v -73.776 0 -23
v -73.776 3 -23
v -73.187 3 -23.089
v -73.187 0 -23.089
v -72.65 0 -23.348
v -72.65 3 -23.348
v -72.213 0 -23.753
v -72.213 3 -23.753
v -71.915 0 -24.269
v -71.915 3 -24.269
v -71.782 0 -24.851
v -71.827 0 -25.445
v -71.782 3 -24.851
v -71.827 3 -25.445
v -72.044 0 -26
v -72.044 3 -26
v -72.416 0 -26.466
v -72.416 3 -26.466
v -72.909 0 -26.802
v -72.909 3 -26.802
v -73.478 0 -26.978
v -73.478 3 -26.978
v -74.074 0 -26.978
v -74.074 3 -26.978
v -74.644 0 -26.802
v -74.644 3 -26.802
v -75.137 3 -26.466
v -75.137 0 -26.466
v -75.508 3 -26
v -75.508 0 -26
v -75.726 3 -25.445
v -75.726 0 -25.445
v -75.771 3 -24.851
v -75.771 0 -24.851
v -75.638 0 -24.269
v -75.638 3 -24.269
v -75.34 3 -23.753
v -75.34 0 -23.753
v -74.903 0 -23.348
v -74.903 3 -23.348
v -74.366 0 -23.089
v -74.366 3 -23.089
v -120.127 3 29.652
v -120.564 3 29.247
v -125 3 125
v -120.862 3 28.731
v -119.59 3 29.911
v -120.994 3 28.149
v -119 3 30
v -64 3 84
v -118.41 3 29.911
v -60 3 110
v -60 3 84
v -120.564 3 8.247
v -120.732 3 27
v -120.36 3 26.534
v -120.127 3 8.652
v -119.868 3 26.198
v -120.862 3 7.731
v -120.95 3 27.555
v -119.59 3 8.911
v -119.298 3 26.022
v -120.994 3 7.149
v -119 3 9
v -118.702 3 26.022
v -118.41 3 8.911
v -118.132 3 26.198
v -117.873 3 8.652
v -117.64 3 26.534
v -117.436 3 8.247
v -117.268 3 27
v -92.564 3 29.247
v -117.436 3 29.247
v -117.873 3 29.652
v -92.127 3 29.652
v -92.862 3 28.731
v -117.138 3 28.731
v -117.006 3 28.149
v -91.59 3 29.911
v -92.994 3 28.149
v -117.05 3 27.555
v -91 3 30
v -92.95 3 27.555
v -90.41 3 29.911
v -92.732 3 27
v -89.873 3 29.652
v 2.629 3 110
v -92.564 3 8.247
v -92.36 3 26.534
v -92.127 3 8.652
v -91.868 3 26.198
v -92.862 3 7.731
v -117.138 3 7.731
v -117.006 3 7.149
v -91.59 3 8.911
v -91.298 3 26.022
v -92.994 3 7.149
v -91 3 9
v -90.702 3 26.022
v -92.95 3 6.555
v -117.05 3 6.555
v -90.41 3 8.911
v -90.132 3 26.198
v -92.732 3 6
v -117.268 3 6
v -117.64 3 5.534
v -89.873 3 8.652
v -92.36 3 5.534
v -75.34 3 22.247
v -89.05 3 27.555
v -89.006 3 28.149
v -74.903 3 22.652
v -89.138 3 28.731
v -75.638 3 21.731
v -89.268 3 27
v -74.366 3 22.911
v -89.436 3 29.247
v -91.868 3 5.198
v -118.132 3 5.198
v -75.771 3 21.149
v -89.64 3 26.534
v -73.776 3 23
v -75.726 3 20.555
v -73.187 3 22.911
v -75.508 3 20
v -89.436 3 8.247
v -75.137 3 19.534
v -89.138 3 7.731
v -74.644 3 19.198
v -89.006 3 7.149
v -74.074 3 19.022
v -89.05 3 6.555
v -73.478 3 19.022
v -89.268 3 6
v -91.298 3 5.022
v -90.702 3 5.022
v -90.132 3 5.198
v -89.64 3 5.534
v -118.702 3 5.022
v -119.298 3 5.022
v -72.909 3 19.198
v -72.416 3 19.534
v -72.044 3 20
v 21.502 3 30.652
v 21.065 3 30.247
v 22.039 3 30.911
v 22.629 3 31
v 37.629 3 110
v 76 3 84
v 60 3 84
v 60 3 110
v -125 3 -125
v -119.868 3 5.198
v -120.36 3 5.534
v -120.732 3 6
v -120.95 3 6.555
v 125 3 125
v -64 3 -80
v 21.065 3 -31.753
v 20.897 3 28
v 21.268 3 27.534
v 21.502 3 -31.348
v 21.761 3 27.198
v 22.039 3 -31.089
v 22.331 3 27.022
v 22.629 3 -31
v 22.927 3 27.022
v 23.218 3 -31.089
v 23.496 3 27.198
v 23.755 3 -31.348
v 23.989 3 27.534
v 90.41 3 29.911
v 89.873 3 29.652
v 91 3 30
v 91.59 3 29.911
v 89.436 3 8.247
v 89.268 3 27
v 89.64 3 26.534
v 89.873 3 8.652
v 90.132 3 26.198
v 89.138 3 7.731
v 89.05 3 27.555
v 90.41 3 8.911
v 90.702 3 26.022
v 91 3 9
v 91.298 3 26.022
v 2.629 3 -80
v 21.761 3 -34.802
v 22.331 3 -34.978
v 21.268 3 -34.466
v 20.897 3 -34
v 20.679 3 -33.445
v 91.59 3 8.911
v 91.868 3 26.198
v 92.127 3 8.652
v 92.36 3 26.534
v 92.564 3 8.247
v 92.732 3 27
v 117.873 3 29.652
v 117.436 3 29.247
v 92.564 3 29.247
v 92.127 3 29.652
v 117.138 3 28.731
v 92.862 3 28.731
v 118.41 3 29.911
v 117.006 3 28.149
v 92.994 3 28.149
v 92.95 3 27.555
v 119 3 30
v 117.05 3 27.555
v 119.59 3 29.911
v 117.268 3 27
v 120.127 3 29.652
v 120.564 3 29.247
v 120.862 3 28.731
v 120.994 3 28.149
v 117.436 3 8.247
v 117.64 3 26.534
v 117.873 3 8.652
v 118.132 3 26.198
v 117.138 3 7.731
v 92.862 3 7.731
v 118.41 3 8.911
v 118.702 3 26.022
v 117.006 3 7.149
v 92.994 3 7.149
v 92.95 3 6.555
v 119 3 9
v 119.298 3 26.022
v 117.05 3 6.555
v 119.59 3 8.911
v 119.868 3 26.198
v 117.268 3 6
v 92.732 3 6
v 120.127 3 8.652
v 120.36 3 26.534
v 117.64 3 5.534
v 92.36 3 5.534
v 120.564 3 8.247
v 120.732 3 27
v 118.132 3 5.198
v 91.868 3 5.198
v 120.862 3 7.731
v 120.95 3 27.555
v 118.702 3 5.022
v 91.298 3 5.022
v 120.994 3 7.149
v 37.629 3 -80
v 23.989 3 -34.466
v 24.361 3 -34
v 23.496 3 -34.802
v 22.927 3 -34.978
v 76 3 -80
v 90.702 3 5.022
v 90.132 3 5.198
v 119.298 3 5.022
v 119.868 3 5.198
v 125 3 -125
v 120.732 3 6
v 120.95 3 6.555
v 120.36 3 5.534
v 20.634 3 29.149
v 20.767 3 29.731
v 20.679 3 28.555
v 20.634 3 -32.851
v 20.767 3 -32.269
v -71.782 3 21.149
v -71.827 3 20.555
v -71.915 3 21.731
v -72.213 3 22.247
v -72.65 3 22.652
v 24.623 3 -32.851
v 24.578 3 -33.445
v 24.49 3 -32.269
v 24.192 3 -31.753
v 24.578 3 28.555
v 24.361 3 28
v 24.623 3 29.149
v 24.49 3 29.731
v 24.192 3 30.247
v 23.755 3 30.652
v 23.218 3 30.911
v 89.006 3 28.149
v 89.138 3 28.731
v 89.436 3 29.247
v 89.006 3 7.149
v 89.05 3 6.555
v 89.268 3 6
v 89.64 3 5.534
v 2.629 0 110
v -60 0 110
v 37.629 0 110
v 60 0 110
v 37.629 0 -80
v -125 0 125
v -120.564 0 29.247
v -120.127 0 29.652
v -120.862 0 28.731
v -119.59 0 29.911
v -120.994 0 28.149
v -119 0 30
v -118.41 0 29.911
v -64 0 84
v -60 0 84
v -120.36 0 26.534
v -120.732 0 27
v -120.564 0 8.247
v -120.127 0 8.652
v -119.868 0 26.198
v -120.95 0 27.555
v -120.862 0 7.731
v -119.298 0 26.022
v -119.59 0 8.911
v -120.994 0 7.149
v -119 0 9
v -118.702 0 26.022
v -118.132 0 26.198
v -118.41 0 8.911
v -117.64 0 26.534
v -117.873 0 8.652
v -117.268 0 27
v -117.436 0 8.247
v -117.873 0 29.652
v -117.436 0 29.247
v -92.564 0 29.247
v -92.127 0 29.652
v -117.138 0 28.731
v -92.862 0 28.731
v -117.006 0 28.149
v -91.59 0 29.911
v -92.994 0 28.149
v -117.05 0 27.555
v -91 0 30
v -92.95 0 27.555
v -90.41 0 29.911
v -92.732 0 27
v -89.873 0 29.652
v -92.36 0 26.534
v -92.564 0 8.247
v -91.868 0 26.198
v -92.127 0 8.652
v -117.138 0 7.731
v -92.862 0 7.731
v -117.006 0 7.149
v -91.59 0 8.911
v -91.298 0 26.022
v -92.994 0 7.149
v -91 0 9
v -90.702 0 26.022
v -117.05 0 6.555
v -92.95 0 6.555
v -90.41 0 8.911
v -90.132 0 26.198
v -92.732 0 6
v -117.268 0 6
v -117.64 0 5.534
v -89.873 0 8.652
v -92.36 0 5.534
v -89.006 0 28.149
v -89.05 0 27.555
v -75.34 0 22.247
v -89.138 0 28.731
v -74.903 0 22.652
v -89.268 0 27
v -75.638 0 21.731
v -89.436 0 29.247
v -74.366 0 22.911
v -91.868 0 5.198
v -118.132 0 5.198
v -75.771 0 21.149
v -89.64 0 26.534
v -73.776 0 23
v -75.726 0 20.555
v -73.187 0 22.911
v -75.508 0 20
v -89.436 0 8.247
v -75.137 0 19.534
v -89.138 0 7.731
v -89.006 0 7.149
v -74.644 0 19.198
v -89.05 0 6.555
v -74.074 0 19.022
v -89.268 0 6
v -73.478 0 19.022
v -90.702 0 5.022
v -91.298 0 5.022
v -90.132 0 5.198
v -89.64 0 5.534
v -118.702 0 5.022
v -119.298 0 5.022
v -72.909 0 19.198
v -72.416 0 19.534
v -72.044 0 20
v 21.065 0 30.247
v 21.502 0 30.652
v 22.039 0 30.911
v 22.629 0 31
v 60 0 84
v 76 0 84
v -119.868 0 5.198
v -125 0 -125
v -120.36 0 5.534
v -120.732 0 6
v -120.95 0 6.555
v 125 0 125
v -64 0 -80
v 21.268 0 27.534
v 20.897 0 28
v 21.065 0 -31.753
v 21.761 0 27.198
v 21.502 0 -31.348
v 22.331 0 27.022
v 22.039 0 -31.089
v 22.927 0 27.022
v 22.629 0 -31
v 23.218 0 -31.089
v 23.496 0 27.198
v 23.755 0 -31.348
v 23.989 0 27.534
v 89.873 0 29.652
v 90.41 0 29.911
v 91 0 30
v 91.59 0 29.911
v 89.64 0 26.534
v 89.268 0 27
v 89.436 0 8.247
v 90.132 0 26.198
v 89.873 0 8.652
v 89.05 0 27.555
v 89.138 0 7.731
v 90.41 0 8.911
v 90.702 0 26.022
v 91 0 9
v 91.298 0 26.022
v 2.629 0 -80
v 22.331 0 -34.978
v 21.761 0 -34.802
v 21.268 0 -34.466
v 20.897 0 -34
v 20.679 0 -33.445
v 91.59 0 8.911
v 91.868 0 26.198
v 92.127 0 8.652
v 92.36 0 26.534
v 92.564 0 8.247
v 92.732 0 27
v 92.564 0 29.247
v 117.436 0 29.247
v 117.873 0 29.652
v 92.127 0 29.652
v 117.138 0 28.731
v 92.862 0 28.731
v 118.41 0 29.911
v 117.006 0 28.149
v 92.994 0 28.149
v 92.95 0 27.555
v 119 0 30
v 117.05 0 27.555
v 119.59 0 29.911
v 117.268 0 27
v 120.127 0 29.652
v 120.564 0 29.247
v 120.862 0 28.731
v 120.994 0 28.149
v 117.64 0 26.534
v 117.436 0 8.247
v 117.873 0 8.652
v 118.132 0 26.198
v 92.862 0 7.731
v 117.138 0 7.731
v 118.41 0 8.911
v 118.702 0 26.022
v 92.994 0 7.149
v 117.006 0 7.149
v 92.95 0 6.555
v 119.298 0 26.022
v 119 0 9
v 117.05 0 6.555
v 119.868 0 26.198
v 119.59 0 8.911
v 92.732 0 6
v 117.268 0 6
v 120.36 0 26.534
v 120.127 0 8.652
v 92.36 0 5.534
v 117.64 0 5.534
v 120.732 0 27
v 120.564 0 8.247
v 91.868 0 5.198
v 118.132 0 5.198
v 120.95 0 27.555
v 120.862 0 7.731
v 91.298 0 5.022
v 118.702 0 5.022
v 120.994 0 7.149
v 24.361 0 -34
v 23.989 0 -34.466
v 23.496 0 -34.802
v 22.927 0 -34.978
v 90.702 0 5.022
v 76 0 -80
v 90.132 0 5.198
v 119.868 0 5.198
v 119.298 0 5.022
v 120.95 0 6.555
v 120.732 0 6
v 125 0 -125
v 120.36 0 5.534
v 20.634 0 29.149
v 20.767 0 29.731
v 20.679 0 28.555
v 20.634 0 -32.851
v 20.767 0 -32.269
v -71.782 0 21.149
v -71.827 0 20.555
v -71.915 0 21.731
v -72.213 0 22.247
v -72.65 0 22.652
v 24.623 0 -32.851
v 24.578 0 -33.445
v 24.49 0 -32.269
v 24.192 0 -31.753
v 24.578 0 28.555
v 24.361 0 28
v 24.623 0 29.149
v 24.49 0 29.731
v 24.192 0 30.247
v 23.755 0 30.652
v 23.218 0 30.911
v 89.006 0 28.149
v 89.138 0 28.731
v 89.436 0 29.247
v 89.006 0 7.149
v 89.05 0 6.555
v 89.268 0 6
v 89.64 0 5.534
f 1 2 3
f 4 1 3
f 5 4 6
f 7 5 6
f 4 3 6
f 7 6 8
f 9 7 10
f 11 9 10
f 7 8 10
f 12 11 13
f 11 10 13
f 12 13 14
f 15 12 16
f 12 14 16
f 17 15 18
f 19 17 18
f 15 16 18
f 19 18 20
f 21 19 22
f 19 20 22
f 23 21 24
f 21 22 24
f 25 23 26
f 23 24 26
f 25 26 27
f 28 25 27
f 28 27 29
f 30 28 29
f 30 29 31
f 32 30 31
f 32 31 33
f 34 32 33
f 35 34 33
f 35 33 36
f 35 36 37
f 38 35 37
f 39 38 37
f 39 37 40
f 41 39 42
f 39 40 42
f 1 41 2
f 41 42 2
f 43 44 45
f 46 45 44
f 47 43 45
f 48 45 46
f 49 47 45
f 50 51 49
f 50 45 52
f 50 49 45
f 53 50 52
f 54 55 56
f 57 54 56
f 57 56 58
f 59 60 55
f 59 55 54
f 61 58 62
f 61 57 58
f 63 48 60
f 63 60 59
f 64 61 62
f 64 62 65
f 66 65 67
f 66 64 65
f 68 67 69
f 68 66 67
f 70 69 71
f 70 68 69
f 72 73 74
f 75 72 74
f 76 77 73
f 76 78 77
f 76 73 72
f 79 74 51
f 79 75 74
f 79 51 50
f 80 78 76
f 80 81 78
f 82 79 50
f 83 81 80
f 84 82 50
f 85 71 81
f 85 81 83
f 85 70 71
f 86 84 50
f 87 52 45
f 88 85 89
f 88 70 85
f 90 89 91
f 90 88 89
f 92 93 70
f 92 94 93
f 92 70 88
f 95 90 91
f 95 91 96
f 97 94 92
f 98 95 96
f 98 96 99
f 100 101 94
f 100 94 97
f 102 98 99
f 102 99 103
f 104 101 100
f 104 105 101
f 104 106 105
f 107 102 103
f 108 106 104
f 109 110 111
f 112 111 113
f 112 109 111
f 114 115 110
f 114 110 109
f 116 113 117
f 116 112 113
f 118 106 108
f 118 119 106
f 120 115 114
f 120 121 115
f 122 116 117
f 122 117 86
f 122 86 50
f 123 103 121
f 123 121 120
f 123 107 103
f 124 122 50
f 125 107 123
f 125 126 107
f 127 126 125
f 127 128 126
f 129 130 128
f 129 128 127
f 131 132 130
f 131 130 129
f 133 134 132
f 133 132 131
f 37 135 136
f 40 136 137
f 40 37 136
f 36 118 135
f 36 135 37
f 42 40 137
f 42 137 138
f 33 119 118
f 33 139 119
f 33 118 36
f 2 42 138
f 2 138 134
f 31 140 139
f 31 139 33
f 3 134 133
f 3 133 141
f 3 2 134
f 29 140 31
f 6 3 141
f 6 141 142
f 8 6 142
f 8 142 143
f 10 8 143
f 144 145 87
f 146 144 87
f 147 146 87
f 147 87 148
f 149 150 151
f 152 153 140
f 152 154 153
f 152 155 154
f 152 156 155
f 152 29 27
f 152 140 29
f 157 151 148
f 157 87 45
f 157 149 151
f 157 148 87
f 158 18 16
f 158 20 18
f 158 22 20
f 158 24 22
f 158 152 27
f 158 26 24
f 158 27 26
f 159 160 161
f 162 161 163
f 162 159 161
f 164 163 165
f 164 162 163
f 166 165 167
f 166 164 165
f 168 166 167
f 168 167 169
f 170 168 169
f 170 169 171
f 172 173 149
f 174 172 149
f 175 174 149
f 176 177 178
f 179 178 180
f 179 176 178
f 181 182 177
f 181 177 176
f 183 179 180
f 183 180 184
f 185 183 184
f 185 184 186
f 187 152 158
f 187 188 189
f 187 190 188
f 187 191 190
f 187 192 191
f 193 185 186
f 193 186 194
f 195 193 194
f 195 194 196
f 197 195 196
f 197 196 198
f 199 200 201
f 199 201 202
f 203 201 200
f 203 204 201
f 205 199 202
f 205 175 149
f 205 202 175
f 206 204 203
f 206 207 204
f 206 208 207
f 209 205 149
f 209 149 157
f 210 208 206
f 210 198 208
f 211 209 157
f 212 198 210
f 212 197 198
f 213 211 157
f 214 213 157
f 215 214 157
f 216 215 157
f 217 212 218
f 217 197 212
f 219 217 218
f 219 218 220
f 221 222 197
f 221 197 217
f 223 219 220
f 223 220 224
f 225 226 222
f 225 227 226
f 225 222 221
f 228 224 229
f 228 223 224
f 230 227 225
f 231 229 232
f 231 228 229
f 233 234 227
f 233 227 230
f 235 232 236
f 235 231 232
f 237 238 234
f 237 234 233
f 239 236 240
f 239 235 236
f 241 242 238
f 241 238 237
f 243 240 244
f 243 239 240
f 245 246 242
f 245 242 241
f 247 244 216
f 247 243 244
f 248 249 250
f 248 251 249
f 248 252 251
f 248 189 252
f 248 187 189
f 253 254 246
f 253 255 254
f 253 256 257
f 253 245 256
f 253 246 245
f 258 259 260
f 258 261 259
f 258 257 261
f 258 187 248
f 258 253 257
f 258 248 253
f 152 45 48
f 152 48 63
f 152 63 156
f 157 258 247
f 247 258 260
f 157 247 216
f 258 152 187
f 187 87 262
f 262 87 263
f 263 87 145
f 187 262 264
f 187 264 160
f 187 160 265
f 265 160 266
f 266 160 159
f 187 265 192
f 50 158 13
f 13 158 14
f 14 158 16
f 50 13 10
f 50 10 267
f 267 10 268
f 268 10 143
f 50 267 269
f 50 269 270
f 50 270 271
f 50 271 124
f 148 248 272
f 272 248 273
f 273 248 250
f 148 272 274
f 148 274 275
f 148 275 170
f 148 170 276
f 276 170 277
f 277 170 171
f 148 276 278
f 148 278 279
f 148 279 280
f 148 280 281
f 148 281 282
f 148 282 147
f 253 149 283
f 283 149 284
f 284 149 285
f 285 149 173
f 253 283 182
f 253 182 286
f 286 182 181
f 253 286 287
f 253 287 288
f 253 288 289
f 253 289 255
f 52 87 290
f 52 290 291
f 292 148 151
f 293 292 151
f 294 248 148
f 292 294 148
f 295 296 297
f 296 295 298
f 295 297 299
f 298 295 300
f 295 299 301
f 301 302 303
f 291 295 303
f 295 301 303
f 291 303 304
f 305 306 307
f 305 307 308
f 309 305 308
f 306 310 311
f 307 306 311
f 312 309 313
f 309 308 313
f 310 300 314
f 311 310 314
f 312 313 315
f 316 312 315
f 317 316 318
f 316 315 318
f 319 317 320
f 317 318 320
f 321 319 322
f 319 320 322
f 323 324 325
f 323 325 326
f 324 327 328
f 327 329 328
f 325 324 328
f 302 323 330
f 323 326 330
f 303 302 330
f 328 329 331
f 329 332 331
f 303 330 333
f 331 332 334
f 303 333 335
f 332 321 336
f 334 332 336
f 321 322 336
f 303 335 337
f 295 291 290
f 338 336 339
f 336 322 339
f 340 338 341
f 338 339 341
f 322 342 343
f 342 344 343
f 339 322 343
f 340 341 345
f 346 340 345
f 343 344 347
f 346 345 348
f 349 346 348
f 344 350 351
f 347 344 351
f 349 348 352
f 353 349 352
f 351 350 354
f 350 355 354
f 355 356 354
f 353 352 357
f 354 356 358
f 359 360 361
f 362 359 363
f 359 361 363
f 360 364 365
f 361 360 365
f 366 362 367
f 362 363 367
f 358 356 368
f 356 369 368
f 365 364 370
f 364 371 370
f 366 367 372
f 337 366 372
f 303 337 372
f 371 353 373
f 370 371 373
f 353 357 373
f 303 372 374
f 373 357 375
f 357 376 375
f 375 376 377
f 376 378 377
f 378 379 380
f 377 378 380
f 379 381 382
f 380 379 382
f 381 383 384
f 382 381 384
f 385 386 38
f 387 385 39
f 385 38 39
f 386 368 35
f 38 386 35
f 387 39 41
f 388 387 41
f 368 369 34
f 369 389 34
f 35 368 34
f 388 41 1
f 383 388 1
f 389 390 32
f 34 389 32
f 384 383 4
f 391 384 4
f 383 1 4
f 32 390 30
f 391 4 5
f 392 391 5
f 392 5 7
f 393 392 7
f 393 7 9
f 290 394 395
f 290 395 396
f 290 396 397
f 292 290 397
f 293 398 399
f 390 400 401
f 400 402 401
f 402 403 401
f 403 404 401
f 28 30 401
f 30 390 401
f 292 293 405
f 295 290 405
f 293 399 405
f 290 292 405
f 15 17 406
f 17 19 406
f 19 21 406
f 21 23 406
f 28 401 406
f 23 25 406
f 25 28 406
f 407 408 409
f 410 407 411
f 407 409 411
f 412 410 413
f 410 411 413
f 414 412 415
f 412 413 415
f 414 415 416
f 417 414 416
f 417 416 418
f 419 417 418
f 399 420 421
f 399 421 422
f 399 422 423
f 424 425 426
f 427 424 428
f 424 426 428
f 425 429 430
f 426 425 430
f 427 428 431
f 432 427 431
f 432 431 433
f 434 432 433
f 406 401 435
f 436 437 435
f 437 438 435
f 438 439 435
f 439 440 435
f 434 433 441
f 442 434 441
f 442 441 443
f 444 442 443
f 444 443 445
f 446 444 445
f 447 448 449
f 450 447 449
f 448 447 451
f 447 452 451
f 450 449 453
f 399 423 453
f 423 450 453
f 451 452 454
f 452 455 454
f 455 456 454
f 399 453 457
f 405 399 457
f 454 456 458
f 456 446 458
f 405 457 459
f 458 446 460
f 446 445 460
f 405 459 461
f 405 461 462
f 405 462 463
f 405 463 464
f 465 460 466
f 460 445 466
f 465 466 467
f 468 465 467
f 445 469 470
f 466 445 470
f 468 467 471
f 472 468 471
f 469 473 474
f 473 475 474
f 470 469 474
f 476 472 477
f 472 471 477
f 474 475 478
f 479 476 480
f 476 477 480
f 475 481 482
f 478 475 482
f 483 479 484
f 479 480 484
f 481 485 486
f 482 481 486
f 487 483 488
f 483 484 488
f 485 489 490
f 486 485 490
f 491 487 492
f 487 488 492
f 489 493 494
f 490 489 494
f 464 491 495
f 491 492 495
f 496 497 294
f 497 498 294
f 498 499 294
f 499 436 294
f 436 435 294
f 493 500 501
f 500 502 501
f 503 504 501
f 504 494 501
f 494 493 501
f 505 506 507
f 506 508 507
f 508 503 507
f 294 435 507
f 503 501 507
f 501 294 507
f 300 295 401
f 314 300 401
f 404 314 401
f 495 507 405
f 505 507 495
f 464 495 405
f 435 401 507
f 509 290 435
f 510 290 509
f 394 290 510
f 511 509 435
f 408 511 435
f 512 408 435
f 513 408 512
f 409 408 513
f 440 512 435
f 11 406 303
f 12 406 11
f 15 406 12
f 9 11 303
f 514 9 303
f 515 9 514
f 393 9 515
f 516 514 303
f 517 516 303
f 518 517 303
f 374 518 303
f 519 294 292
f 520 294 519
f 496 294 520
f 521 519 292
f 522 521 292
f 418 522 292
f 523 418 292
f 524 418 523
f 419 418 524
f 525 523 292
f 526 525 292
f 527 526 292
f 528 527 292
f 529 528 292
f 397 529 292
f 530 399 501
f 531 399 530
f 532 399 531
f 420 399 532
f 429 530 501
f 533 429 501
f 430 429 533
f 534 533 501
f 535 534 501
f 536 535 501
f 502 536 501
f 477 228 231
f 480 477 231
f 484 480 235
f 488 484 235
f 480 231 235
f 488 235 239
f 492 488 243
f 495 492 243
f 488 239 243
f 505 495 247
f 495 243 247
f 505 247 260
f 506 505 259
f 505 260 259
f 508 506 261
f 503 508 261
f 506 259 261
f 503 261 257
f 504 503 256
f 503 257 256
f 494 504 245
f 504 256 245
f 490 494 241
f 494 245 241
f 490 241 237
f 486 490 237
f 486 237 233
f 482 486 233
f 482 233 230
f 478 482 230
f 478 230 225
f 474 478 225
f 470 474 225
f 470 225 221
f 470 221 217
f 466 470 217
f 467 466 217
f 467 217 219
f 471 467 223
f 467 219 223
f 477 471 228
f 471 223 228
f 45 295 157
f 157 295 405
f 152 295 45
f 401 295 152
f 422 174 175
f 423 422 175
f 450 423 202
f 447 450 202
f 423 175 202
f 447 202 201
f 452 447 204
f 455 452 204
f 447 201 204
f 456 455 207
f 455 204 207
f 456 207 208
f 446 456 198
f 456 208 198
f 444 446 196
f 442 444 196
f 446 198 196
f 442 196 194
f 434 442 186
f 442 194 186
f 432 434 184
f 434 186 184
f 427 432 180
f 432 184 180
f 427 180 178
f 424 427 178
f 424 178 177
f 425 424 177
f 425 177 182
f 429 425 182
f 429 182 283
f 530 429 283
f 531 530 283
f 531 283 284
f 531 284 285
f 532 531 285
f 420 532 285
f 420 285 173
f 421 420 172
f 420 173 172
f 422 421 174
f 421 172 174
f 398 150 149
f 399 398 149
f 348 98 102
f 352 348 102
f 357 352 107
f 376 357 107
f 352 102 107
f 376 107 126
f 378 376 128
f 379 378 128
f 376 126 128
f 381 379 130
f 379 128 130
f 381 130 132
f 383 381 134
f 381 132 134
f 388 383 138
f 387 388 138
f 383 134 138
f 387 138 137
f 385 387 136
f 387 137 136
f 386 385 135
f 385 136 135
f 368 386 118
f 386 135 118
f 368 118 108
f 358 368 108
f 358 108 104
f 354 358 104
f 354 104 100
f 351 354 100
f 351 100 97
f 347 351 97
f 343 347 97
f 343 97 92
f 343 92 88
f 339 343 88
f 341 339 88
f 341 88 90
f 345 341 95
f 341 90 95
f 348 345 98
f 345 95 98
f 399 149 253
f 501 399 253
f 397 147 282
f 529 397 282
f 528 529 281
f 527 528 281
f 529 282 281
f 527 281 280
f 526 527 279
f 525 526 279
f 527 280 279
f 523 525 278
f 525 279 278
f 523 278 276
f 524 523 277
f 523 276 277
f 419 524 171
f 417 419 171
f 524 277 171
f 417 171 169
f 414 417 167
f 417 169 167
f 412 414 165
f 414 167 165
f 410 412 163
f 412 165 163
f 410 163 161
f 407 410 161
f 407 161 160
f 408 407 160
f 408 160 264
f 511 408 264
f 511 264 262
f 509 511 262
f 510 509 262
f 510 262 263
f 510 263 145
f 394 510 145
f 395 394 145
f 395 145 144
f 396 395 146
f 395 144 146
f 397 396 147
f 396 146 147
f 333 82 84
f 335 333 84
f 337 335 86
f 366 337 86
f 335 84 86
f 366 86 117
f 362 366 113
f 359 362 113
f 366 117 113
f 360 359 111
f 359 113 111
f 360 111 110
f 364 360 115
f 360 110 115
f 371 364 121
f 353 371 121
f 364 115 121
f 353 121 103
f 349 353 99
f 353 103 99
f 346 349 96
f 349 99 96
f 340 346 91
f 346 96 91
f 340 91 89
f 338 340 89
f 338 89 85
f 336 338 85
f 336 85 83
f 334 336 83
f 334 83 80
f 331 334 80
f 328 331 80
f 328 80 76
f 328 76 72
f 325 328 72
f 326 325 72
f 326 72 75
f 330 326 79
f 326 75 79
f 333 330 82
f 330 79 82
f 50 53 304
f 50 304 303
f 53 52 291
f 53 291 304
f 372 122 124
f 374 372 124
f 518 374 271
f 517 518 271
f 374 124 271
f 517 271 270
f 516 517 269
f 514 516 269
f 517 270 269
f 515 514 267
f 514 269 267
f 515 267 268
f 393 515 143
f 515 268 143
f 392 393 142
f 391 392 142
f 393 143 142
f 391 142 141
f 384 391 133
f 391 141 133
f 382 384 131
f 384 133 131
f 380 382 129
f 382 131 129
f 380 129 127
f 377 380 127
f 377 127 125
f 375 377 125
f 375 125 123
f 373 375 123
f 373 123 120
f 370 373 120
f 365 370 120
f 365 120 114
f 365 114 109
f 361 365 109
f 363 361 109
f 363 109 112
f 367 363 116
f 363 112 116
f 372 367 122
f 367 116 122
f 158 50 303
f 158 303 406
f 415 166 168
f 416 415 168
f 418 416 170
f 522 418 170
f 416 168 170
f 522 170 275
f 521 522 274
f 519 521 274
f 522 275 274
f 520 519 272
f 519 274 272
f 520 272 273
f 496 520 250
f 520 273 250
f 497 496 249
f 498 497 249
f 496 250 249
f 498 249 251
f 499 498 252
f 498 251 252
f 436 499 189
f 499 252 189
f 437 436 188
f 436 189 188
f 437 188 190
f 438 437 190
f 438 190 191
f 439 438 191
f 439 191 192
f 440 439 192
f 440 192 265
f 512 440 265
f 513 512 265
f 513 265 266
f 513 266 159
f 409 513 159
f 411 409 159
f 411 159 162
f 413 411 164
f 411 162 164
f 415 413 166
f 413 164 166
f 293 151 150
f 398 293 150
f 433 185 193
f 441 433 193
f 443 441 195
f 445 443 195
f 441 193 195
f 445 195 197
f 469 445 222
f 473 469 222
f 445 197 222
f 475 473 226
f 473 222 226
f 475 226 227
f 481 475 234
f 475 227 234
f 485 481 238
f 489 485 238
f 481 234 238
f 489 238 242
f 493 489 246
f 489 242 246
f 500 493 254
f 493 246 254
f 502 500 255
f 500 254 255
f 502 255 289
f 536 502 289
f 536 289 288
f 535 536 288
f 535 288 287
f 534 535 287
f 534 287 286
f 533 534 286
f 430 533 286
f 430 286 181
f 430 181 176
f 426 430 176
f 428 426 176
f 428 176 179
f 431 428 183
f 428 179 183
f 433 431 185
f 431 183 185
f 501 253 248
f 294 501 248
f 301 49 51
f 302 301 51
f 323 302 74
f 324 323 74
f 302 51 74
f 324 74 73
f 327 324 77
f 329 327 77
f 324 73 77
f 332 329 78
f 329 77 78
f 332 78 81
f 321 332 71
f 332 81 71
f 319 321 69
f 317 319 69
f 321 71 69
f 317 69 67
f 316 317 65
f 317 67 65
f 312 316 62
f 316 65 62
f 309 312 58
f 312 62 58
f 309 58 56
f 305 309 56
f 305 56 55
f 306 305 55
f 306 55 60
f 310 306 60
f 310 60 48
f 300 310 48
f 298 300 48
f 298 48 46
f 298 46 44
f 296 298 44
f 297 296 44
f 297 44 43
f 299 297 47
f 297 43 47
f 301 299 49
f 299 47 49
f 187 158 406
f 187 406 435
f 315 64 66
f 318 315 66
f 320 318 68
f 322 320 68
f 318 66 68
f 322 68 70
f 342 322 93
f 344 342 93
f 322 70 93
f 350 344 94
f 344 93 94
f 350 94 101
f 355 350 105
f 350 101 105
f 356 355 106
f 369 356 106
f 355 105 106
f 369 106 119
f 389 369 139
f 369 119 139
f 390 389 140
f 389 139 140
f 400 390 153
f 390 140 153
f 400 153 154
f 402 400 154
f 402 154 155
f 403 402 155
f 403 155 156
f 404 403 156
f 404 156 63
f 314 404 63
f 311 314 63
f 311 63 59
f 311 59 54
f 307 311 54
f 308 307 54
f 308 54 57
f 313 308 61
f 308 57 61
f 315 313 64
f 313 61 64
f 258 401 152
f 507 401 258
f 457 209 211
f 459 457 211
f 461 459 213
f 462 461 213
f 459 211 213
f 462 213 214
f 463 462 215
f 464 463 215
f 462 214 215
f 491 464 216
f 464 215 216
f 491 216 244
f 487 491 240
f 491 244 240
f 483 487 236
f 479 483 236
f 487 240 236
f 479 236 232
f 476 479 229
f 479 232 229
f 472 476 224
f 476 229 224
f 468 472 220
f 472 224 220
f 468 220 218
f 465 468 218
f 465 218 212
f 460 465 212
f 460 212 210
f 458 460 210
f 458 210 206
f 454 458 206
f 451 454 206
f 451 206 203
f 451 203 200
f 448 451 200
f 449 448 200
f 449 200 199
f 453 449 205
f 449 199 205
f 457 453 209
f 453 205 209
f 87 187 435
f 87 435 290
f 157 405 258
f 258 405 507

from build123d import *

# Parameters (mm, degrees)
SKETCH1_W           = 250
SKETCH1_H           = 250
BOSS_EXTRUDE1_DEPTH = 3
SKETCH4_R           = 2
CUT_EXTRUDE1_DEPTH  = 3
CUT_EXTRUDE2_DEPTH  = 3


with BuildPart() as part:
    # Sketch1 → Boss-Extrude1 (new body)
    with BuildSketch(Plane(origin=(0, 0, 0), x_dir=(1, 0, 0), z_dir=(0, 1, 0))):
        Rectangle(SKETCH1_W, SKETCH1_H)
    extrude(amount=BOSS_EXTRUDE1_DEPTH)

    # Sketch4 → Cut-Extrude1 (cut)
    with BuildSketch(Plane(origin=(0, 3, 0), x_dir=(1, 0, 0), z_dir=(0, 1, 0))):
        with Locations(Location((91, -28, 0), (0, 0, 270))):
            Circle(SKETCH4_R)
        with Locations(Location((91, -7, 0), (0, 0, 270))):
            Circle(SKETCH4_R)
        with Locations(Location((119, -7, 0), (0, 0, 270))):
            Circle(SKETCH4_R)
        with Locations(Location((119, -28, 0), (0, 0, 270))):
            Circle(SKETCH4_R)
        with Locations(Location((22.62859709, -29, 0), (0, 0, 270))):
            Circle(SKETCH4_R)
        with Locations(Location((22.62859709, 33, 0), (0, 0, 270))):
            Circle(SKETCH4_R)
        with Locations(Location((-73.776388534, 25, 0), (0, 0, 270))):
            Circle(SKETCH4_R)
        with Locations(Location((-73.776388534, -21, 0), (0, 0, 270))):
            Circle(SKETCH4_R)
        with Locations(Location((-91, -28, 0), (0, 0, 270))):
            Circle(SKETCH4_R)
        with Locations(Location((-91, -7, 0), (0, 0, 270))):
            Circle(SKETCH4_R)
        with Locations(Location((-119, -7, 0), (0, 0, 270))):
            Circle(SKETCH4_R)
        with Locations(Location((-119, -28, 0), (0, 0, 270))):
            Circle(SKETCH4_R)
    extrude(amount=-CUT_EXTRUDE1_DEPTH, mode=Mode.SUBTRACT)

    # Sketch5 → Cut-Extrude2 (cut)
    with BuildSketch(Plane(origin=(0, 3, 0), x_dir=(1, 0, 0), z_dir=(0, 1, 0))):
        Polygon((2.62859709, -110), (-60, -110), (-60, -84), (-64, -84), (-64, 80), (2.62859709, 80), align=None)
        Polygon((37.62859709, 80), (37.62859709, -110), (60, -110), (60, -84), (76, -84), (76, 80), align=None)
    extrude(amount=-CUT_EXTRUDE2_DEPTH, mode=Mode.SUBTRACT)


solid = part.part
